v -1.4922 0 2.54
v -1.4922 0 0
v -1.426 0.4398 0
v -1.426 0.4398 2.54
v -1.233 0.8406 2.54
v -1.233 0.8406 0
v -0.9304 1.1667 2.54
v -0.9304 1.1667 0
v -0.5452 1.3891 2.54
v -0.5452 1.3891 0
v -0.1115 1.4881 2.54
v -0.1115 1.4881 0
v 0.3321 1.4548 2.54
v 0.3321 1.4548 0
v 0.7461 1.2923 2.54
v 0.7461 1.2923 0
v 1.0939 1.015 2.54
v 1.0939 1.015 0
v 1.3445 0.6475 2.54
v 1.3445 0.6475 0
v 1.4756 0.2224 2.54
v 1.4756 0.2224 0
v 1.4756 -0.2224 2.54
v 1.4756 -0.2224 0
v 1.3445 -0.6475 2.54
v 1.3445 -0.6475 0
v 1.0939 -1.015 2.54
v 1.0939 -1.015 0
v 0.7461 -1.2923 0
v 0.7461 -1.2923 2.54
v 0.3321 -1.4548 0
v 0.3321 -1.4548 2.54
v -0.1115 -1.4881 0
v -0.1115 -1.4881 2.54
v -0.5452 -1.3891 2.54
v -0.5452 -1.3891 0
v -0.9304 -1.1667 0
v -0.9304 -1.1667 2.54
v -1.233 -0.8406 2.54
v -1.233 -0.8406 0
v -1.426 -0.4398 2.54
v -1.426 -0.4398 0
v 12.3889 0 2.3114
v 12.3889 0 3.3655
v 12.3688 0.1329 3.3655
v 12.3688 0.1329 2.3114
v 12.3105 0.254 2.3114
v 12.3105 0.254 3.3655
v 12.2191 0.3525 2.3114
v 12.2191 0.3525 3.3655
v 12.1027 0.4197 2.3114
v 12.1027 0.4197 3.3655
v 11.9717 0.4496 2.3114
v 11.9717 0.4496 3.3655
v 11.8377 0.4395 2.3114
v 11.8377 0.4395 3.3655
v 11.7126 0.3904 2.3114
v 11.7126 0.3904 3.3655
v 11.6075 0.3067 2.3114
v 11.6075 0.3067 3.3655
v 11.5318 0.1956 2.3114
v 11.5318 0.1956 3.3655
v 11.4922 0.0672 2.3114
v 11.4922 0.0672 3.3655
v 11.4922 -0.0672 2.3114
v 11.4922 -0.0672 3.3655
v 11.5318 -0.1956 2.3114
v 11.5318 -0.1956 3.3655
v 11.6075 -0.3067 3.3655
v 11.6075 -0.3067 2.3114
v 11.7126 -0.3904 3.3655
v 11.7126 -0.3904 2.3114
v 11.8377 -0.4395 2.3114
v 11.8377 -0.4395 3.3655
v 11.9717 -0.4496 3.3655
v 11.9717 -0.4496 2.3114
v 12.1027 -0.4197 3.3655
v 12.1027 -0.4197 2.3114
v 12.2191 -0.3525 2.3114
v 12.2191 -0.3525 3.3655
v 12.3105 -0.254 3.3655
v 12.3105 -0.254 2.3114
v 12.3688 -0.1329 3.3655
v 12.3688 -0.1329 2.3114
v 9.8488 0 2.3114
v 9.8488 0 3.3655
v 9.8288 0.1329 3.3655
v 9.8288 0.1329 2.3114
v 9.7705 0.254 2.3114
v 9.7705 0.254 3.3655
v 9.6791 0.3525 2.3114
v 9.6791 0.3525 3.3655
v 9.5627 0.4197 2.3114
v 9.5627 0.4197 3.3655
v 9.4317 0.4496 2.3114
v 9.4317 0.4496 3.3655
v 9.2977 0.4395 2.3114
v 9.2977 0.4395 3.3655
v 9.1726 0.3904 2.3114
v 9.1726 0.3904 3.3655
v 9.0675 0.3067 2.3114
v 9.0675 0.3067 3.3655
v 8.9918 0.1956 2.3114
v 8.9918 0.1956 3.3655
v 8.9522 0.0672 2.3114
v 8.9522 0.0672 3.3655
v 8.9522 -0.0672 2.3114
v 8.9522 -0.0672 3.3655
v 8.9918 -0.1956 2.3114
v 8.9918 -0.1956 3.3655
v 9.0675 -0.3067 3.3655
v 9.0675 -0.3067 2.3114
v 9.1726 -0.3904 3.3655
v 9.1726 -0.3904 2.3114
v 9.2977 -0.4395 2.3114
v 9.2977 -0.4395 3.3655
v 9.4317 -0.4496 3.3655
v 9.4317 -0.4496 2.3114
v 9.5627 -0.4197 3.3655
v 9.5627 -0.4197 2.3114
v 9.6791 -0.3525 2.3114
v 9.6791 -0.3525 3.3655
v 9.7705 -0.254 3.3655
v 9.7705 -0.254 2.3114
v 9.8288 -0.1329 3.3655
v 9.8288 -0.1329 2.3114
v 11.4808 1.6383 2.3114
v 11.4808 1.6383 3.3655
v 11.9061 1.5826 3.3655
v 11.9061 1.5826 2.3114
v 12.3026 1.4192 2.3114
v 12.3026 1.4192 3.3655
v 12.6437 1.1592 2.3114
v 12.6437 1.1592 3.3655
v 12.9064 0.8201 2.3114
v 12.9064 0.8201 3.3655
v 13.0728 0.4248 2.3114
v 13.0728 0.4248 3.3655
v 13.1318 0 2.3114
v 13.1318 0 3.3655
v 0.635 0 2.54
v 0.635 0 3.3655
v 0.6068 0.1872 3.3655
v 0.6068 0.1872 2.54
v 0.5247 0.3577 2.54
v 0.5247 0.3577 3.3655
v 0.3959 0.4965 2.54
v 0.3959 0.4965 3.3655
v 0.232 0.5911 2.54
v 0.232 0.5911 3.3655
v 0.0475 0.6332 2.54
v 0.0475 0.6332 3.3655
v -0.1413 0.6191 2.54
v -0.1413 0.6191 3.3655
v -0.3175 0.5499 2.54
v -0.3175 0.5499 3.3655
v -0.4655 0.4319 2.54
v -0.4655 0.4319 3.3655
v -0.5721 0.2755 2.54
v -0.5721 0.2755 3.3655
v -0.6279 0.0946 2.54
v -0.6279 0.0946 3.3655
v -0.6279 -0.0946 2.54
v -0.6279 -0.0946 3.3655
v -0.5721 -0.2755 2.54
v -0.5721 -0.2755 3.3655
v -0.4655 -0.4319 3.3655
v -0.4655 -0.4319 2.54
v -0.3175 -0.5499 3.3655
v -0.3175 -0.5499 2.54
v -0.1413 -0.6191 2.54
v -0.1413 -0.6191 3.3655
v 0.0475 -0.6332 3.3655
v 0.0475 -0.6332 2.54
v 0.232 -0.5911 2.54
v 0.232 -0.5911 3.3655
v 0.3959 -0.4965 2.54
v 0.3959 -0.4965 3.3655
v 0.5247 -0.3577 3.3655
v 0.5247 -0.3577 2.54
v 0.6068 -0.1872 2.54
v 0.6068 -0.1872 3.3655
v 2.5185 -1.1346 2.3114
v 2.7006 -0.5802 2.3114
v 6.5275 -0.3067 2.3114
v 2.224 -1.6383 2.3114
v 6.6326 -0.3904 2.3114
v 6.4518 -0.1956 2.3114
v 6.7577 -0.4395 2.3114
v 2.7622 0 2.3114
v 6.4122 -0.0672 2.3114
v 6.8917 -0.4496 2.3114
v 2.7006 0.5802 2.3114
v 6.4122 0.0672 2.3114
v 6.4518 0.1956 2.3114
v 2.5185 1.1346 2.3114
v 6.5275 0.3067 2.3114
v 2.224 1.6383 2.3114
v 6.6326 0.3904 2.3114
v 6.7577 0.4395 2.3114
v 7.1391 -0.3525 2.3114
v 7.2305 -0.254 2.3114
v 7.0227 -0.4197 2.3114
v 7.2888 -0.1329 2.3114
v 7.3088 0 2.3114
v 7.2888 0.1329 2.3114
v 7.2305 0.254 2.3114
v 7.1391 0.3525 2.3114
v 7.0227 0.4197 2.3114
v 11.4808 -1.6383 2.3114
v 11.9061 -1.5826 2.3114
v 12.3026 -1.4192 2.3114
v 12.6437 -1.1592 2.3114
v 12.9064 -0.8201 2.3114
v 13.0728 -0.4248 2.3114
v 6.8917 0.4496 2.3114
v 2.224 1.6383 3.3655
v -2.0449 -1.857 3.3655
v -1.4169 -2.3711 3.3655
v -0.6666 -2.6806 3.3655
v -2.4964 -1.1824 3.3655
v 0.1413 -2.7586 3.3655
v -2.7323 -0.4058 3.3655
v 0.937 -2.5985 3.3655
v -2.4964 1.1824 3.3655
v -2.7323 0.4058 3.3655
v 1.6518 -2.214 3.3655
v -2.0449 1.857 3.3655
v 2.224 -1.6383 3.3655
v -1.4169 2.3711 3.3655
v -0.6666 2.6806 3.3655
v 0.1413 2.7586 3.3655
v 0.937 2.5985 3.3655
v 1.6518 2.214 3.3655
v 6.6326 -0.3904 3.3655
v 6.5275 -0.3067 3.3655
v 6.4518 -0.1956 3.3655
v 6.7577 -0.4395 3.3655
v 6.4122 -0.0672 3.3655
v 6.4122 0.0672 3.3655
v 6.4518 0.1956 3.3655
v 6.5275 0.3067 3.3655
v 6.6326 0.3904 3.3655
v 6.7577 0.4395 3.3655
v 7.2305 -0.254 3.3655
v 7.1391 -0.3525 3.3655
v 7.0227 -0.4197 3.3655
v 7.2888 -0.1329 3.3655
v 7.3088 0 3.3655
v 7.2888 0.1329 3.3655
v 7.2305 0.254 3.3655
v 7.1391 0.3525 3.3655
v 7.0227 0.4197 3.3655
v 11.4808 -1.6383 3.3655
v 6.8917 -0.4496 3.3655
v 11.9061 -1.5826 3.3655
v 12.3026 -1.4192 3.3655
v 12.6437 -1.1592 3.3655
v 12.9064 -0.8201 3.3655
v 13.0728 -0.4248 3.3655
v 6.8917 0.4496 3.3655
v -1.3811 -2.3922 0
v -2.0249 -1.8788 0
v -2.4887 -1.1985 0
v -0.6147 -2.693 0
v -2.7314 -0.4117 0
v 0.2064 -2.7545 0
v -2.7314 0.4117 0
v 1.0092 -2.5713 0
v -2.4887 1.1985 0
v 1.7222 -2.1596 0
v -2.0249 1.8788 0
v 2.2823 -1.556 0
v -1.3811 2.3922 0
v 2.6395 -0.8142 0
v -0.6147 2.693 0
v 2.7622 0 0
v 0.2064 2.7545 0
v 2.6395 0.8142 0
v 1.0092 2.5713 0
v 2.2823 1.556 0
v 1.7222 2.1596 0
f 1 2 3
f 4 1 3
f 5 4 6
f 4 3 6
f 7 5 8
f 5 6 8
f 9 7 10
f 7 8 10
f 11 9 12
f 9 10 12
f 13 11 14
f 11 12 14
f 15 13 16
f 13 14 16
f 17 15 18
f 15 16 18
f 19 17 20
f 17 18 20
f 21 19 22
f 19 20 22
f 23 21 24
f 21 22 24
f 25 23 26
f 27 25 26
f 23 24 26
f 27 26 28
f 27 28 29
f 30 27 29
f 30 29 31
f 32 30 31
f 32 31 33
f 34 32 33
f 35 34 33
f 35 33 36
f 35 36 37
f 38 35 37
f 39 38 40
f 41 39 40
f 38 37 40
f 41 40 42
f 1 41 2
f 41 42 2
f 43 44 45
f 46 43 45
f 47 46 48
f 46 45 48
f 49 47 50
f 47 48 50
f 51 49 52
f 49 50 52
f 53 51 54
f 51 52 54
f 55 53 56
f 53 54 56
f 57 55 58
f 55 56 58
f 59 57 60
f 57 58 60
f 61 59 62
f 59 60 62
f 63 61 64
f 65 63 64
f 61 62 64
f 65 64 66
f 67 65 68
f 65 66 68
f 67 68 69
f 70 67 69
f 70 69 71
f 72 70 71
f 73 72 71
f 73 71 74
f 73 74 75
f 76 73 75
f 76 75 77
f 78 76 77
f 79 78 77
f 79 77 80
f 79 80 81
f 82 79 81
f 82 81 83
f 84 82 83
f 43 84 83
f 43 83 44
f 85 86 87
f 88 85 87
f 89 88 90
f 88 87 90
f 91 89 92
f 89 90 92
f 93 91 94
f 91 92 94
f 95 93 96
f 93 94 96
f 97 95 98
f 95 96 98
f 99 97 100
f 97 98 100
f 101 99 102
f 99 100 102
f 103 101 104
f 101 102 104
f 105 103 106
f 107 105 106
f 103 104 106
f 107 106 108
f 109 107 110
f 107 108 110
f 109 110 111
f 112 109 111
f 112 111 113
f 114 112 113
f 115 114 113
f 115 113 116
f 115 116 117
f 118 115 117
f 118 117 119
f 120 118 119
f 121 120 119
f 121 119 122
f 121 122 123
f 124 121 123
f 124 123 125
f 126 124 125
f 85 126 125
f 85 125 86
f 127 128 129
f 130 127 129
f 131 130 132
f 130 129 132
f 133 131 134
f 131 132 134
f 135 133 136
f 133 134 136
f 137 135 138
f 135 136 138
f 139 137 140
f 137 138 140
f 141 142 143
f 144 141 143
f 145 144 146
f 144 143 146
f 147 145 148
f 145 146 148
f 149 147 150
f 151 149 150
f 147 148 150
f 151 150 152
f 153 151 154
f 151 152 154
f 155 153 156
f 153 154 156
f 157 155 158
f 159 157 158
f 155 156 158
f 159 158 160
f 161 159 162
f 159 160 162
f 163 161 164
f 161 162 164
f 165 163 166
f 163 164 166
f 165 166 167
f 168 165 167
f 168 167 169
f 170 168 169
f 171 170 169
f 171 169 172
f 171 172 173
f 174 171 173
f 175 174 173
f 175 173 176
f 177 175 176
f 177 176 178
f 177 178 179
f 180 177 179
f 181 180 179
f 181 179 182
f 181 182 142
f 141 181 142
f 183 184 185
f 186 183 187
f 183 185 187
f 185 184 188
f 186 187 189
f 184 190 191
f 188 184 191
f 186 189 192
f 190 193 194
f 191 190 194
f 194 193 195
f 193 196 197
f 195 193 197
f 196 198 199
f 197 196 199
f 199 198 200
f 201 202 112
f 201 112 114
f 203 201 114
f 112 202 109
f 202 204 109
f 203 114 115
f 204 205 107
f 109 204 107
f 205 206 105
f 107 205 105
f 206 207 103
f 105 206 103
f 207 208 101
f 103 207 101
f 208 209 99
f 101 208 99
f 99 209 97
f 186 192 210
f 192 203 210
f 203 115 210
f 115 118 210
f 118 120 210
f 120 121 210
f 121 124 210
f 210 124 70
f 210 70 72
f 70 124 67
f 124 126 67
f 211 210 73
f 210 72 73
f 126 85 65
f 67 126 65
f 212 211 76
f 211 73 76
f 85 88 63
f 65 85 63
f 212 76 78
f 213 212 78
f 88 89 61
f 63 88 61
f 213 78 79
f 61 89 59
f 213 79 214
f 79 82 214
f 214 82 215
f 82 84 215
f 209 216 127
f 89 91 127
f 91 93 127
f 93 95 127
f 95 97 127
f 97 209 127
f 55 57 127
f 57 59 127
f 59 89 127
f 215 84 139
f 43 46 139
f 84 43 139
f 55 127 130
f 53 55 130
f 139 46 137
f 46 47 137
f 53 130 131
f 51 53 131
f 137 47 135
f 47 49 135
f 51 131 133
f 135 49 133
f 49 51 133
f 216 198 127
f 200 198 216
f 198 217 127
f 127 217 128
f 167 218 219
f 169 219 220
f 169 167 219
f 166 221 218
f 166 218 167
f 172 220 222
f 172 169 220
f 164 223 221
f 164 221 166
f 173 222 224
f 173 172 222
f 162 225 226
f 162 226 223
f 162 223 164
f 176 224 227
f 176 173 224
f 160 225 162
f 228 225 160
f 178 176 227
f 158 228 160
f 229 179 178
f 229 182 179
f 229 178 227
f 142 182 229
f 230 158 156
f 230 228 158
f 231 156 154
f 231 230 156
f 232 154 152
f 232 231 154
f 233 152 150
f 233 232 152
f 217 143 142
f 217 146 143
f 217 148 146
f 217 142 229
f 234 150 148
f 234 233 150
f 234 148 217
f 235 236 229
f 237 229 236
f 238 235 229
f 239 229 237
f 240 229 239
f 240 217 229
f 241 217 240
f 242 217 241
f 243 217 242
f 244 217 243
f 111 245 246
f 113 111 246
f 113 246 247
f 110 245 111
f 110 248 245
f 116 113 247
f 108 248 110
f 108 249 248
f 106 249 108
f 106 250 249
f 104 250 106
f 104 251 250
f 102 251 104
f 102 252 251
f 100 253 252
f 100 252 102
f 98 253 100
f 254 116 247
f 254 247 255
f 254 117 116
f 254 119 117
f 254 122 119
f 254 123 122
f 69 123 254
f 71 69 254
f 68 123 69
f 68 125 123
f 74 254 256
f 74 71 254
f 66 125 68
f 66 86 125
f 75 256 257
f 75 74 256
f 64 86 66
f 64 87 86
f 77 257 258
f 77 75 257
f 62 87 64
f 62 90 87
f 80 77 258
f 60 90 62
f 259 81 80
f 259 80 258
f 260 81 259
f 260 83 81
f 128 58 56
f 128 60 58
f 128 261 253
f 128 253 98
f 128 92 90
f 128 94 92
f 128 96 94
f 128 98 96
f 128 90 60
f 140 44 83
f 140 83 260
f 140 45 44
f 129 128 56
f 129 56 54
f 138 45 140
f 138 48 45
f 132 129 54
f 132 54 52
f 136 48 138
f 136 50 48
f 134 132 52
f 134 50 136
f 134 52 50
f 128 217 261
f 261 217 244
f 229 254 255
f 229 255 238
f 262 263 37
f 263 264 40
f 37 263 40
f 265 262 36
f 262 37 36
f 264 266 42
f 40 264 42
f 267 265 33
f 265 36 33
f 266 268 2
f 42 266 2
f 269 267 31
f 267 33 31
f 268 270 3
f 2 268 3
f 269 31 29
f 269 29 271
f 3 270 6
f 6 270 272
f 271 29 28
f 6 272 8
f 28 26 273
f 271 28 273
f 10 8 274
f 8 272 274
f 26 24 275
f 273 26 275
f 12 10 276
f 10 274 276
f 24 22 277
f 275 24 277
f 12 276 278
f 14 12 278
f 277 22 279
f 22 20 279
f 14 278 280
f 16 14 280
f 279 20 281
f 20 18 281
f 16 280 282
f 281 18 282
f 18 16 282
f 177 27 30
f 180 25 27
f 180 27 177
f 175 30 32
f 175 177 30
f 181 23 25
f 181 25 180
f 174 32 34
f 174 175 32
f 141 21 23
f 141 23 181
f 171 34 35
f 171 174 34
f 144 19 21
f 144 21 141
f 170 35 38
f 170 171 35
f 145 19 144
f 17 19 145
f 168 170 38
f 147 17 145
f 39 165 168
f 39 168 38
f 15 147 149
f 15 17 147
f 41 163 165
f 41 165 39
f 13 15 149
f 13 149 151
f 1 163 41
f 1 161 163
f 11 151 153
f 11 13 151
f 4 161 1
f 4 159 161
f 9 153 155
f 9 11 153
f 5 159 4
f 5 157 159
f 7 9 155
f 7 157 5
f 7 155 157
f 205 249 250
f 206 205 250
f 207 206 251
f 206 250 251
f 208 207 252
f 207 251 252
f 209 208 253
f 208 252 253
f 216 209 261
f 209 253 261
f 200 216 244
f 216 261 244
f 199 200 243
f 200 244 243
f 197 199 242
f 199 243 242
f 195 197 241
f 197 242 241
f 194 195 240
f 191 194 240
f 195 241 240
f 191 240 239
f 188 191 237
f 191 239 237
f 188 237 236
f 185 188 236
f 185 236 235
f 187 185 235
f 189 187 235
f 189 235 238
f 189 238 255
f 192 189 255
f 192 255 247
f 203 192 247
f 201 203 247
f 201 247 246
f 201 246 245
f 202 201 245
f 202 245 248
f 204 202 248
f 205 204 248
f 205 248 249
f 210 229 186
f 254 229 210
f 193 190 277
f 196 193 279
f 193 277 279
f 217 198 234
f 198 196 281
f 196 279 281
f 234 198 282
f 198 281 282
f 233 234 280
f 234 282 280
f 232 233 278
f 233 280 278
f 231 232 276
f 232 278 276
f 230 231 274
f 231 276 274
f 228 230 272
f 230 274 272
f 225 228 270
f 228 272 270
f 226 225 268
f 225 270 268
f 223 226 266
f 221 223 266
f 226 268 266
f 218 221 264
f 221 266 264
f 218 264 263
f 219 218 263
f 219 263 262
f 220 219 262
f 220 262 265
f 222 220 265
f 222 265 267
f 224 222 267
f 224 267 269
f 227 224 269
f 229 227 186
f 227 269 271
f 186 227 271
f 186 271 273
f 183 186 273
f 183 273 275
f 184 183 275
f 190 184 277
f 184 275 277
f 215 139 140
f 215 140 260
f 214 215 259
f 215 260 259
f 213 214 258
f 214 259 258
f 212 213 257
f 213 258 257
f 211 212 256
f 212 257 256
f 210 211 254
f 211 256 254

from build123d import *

# Parameters (mm, degrees)
SKETCH1_R           = 2.76225
BOSS_EXTRUDE1_DEPTH = 3.3655
SKETCH2_W           = 13.1318
SKETCH2_H           = 3.2766
BOSS_EXTRUDE2_DEPTH = 1.0541
FILLET1_R           = 1.651
SKETCH3_R           = 0.635
CUT_EXTRUDE1_DEPTH  = 3.3655
SKETCH4_R           = 1.49225
CUT_EXTRUDE2_DEPTH  = 2.54
SKETCH5_R           = 0.45085
CUT_EXTRUDE3_DEPTH  = 14.834720946


with BuildPart() as part:
    # Sketch1 → Boss-Extrude1 (new body)
    with BuildSketch(Plane.XY):
        Circle(SKETCH1_R)
    extrude(amount=BOSS_EXTRUDE1_DEPTH)

    # Sketch2 → Boss-Extrude2 (add)
    with BuildSketch(Plane.XY.offset(3.3655)):
        with Locations((6.5659, 0)):
            Rectangle(SKETCH2_W, SKETCH2_H)
    extrude(amount=-BOSS_EXTRUDE2_DEPTH)

    # Fillet1
    # the kernel refuses this fillet: 1.651 mm, written as the material it takes off along each edge
    with BuildSketch(Plane(origin=(13.1318, -1.6383, 7.493), x_dir=(-1, 0, 0), z_dir=(0, 0, -1))) as fillet1_piece_1:
        with BuildLine():
            CenterArc((FILLET1_R, FILLET1_R), FILLET1_R, 180, 90)
            Line((0, FILLET1_R), (0, 0))
            Line((0, 0), (FILLET1_R, 0))
        make_face()
    extrude(amount=9.3091, mode=Mode.SUBTRACT)
    with BuildSketch(Plane(origin=(13.1318, 1.6383, 7.493), x_dir=(-1, 0, 0), z_dir=(0, 0, -1))) as fillet1_piece_2:
        with BuildLine():
            CenterArc((FILLET1_R, -FILLET1_R), FILLET1_R, 90, 90)
            Line((0, -FILLET1_R), (0, 0))
            Line((0, 0), (FILLET1_R, 0))
        make_face()
    extrude(amount=9.3091, mode=Mode.SUBTRACT)

    # Sketch3 → Cut-Extrude1 (cut)
    with BuildSketch(Plane.XY.offset(3.3655)):
        Circle(SKETCH3_R)
    extrude(amount=-CUT_EXTRUDE1_DEPTH, mode=Mode.SUBTRACT)

    # Sketch4 → Cut-Extrude2 (cut)
    with BuildSketch(Plane(origin=(0, 0, 0), x_dir=(-1, 0, 0), z_dir=(0, 0, -1))):
        Circle(SKETCH4_R)
    extrude(amount=-CUT_EXTRUDE2_DEPTH, mode=Mode.SUBTRACT)

    # Sketch5 → Cut-Extrude3 (cut, through all)
    with BuildSketch(Plane.XY.offset(3.3655)):
        with Locations((6.858, 0)):
            Circle(SKETCH5_R)
        with Locations((9.398, 0)):
            Circle(SKETCH5_R)
        with Locations((11.938, 0)):
            Circle(SKETCH5_R)
    extrude(amount=-CUT_EXTRUDE3_DEPTH, mode=Mode.SUBTRACT)


solid = part.part
